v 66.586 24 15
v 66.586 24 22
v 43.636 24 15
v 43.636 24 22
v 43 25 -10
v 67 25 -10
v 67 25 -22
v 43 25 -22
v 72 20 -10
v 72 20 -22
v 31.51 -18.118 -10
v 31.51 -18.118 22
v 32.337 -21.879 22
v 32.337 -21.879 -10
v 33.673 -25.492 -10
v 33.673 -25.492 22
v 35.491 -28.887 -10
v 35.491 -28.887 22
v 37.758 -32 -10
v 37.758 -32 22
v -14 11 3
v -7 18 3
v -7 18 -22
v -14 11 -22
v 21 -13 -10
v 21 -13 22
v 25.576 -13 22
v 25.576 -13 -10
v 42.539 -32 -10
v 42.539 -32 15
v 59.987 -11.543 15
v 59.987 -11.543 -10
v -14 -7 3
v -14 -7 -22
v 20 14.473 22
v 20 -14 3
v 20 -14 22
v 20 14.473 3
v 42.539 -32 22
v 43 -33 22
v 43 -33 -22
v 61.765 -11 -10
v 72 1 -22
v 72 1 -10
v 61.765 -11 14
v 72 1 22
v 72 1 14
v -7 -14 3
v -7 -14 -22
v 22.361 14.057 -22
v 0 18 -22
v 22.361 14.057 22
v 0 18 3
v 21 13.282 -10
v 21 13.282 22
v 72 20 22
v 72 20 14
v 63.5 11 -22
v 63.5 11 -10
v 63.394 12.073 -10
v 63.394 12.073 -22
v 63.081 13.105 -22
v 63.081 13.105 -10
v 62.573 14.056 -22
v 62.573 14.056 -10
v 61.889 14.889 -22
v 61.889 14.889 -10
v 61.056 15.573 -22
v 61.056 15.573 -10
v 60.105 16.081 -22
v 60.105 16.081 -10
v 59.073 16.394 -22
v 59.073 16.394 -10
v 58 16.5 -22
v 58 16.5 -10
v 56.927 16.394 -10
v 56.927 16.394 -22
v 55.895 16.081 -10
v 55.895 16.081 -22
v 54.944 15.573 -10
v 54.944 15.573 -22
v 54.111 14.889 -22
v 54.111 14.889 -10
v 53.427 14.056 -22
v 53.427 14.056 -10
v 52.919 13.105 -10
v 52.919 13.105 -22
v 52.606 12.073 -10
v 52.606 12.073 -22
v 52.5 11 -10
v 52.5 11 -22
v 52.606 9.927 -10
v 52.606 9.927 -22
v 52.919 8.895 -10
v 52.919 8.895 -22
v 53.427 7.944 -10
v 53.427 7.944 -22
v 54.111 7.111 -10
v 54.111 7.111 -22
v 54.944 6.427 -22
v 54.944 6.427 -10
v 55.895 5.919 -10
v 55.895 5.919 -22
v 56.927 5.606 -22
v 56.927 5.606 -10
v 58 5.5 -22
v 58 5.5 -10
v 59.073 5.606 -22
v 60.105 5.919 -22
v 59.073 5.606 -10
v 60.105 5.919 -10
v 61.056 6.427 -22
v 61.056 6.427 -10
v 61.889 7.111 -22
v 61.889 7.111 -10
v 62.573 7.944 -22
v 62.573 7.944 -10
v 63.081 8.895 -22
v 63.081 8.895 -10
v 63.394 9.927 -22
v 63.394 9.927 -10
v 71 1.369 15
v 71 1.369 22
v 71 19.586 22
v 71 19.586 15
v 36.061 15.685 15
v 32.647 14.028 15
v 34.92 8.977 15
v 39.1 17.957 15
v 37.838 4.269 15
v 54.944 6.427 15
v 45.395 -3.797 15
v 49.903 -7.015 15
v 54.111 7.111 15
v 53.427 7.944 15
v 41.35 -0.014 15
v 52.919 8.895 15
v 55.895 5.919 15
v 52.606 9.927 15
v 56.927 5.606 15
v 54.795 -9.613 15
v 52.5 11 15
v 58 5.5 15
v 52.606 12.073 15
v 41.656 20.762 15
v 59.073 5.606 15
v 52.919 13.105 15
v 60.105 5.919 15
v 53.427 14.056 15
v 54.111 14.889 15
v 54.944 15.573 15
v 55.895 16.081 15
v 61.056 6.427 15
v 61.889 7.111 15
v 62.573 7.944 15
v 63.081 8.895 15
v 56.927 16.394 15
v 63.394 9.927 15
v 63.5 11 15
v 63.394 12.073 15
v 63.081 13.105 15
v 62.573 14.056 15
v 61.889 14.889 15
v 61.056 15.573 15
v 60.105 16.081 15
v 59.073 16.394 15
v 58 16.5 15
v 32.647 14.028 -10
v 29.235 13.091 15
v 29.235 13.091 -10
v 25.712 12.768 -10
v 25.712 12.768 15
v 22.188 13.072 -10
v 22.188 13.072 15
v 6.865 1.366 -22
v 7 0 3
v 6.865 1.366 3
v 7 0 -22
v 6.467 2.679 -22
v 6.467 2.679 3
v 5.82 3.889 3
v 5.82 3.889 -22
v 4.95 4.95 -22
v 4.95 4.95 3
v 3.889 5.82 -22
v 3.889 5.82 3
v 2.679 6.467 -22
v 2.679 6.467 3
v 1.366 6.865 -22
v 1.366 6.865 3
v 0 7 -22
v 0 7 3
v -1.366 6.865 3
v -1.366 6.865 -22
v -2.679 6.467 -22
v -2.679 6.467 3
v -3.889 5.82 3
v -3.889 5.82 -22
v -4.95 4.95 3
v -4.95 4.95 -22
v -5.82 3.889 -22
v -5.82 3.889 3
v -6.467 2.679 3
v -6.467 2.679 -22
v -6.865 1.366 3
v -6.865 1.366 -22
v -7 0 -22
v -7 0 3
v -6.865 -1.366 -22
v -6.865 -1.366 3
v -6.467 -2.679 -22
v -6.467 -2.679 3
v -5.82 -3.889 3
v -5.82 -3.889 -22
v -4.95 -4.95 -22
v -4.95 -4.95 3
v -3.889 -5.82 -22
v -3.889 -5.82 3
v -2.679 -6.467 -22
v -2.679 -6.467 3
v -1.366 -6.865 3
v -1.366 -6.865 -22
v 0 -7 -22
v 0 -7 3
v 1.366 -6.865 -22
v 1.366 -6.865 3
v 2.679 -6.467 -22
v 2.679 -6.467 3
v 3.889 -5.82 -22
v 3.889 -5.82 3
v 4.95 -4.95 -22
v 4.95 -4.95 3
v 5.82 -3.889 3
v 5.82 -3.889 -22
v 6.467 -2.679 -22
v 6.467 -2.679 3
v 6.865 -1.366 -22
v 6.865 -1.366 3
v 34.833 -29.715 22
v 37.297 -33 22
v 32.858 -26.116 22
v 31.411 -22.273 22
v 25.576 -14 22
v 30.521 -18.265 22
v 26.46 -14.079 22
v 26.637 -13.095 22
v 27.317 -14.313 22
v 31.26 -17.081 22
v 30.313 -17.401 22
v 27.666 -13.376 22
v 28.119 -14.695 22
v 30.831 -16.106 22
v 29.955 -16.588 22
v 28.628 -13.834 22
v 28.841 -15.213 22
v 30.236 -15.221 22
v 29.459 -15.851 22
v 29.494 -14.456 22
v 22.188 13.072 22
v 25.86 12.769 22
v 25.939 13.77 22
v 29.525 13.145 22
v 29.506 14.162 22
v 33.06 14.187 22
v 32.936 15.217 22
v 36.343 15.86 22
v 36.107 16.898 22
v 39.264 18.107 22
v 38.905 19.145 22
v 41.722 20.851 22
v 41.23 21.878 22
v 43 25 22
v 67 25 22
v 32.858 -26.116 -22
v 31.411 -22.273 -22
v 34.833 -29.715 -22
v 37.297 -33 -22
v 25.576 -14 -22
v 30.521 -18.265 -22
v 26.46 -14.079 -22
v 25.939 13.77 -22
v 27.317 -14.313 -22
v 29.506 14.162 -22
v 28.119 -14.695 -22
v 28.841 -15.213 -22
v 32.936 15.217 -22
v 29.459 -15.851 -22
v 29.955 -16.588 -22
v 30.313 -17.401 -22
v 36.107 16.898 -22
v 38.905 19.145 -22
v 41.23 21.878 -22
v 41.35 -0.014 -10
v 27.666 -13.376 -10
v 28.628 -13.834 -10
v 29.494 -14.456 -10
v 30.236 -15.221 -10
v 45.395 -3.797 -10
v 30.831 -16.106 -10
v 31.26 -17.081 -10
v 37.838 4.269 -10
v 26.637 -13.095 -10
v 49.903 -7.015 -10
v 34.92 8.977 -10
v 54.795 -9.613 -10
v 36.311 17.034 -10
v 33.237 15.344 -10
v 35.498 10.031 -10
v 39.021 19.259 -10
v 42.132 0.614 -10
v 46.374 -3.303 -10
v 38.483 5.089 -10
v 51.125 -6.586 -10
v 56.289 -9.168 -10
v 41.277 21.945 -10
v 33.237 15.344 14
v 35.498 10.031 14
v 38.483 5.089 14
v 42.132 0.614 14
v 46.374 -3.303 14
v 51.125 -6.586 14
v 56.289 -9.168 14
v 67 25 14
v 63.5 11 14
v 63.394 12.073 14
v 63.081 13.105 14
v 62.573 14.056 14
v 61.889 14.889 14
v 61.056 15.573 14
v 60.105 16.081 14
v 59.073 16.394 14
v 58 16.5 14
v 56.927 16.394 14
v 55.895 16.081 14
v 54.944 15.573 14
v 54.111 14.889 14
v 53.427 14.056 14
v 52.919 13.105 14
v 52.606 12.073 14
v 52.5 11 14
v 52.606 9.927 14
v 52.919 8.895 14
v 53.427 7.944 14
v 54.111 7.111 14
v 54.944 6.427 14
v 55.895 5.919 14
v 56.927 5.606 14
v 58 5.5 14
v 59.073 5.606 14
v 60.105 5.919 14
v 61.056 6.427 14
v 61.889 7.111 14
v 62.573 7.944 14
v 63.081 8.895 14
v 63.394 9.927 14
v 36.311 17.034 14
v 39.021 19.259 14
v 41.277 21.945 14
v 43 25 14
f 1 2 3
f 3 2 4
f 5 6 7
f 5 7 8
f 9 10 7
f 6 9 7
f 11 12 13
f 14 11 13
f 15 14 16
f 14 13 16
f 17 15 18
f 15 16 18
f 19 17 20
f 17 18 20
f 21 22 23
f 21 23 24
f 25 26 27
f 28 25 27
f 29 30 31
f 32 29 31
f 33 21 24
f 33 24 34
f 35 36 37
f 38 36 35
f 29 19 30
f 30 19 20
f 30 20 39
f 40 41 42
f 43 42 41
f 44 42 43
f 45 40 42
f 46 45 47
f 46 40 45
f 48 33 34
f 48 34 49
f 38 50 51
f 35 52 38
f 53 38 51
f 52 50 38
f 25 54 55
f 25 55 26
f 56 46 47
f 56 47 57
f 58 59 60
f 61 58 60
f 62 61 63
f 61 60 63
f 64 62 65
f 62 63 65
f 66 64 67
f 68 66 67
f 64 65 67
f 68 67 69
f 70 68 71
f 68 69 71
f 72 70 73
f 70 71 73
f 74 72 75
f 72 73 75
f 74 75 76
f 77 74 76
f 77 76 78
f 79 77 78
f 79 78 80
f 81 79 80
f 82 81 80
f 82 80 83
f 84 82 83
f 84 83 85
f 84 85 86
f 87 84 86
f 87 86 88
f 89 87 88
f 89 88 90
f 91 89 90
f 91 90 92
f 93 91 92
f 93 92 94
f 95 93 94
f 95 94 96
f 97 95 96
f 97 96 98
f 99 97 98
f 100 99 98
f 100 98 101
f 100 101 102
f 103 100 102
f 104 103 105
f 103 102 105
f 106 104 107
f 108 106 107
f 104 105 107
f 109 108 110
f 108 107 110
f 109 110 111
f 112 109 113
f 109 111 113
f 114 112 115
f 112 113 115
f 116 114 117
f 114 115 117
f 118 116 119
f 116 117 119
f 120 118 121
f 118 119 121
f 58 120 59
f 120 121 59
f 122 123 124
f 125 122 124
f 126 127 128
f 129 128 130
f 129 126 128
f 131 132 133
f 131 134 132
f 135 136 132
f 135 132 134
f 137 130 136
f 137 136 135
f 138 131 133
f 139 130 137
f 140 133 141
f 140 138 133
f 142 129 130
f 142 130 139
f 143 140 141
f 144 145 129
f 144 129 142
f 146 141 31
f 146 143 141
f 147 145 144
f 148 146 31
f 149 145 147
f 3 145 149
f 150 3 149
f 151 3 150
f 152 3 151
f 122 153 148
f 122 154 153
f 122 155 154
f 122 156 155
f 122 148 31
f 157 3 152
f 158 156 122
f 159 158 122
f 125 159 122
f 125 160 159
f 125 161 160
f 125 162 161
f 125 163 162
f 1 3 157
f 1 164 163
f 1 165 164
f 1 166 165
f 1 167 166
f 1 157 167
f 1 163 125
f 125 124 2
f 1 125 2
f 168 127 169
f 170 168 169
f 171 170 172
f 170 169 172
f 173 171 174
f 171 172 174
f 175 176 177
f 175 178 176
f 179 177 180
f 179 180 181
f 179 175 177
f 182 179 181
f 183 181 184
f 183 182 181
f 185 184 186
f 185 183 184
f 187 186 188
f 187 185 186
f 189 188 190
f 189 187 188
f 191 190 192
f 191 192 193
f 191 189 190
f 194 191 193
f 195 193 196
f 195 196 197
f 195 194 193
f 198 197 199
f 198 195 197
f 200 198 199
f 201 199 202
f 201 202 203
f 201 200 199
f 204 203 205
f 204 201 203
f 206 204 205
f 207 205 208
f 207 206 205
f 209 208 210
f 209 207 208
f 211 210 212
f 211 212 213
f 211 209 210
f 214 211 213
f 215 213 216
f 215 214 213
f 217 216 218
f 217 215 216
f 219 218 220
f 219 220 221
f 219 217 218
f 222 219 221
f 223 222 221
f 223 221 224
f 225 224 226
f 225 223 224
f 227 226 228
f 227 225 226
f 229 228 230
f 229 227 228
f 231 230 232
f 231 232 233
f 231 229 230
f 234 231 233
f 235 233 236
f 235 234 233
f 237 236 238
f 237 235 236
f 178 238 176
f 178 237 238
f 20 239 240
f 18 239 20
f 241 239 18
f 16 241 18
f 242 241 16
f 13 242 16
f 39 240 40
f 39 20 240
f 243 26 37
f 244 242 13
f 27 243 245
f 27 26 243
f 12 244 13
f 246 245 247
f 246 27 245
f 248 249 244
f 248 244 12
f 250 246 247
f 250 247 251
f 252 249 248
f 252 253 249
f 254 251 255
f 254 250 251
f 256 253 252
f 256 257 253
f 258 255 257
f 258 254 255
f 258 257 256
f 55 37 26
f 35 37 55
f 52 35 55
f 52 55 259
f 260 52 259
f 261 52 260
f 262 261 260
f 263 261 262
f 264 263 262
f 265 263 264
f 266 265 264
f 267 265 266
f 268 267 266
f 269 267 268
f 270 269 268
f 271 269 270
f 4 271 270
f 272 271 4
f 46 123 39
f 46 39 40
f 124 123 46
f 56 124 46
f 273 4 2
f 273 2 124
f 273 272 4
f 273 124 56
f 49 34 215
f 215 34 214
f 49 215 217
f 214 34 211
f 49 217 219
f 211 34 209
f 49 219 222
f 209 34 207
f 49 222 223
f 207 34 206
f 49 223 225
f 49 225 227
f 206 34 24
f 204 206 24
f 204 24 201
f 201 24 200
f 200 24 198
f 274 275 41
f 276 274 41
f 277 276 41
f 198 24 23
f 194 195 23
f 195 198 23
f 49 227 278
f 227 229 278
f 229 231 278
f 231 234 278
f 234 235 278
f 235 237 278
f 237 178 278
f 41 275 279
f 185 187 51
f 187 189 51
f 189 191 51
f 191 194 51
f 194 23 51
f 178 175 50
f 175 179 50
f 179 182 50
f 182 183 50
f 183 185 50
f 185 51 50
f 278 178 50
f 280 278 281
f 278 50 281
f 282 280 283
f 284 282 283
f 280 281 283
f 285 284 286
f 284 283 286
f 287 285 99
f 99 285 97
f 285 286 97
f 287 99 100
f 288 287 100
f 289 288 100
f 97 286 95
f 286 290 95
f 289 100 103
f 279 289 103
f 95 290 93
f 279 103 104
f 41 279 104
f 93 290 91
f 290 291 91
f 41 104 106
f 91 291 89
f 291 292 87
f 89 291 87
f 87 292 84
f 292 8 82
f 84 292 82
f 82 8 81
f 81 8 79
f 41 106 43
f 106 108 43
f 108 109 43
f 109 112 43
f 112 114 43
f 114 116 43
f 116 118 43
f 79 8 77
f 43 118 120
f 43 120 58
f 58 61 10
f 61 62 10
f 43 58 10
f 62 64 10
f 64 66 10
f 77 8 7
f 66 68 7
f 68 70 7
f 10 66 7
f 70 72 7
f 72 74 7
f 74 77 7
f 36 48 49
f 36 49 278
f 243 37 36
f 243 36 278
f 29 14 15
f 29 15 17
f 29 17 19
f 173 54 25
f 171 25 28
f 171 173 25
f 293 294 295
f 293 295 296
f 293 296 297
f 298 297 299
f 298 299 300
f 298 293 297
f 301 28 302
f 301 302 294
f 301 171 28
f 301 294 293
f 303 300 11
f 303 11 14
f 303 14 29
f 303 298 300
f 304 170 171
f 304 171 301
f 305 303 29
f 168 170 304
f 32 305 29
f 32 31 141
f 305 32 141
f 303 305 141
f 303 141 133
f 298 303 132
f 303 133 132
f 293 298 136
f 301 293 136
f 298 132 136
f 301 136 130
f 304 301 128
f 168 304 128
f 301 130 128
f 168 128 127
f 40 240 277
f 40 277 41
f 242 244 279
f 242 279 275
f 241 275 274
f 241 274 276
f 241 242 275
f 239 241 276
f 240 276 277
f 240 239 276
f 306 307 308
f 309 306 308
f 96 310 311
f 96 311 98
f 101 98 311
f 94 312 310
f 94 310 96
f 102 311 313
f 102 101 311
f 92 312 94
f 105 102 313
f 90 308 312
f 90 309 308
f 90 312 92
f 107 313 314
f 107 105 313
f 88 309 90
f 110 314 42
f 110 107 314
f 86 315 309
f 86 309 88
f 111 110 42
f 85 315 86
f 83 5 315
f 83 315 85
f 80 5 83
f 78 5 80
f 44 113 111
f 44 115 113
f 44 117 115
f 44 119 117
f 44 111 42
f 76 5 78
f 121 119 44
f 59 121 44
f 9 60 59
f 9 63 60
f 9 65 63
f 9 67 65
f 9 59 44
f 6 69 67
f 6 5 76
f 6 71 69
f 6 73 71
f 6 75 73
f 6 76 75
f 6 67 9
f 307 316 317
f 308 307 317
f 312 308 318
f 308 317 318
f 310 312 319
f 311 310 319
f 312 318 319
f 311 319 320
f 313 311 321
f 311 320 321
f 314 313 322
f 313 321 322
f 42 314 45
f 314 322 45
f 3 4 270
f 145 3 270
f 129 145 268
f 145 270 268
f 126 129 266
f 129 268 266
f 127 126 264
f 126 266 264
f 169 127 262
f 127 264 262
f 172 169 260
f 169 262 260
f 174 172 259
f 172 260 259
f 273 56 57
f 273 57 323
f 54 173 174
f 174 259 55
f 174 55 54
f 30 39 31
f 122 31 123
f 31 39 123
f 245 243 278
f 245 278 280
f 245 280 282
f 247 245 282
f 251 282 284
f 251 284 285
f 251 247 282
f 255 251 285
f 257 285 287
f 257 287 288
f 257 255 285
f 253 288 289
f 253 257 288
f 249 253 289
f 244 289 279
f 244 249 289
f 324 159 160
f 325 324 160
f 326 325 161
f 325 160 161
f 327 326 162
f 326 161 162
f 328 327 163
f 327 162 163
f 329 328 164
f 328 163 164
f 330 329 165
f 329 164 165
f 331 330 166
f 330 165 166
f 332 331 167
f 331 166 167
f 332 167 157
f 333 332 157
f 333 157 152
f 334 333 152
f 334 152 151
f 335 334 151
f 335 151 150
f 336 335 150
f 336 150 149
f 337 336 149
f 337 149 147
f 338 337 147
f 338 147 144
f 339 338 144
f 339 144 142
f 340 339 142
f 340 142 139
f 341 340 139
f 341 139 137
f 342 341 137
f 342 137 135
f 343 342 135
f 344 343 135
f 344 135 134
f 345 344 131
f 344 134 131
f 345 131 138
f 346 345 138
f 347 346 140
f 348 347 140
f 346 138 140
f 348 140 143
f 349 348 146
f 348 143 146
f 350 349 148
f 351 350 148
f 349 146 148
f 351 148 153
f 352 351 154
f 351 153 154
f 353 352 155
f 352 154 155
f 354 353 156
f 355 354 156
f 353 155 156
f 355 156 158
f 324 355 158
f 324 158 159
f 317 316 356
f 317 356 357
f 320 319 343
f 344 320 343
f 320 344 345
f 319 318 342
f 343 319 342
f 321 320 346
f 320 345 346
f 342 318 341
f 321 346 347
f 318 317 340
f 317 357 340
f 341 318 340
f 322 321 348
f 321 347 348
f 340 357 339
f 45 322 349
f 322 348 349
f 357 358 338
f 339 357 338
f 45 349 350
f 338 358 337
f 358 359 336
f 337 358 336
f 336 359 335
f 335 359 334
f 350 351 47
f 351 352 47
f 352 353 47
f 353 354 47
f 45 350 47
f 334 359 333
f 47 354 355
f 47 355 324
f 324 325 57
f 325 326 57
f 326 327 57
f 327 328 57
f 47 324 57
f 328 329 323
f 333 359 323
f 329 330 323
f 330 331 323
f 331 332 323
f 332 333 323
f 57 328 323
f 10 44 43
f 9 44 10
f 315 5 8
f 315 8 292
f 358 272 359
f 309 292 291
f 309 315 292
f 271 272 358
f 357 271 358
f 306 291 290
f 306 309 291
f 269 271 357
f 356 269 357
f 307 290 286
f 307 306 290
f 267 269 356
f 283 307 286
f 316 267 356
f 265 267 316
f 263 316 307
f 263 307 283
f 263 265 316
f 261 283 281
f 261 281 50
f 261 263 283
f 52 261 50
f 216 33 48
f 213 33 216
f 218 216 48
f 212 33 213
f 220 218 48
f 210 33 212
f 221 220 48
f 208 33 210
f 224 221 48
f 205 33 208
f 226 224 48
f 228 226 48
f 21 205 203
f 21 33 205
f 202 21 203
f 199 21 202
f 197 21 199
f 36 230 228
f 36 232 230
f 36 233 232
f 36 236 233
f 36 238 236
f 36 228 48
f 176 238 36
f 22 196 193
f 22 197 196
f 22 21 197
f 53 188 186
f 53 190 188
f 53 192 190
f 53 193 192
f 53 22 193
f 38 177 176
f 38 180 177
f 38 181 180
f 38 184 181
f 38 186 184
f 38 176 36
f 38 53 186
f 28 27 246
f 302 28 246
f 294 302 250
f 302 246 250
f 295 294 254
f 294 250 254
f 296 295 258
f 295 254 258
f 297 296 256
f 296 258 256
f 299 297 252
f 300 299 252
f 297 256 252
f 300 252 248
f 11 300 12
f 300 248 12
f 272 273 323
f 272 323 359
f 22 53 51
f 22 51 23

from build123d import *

# Parameters (mm, degrees)
SKETCH1_R           = 7
BOSS_EXTRUDE1_DEPTH = 22
CUT_EXTRUDE1_START  = 14
CUT_EXTRUDE1_DEPTH  = 24
CUT_EXTRUDE2_START  = -19
SKETCH5_R           = 7
CUT_EXTRUDE2_DEPTH  = 19
SKETCH6_R           = 5.5
CUT_EXTRUDE3_DEPTH  = 91.60353194
CUT_EXTRUDE4_DEPTH  = 7
CUT_EXTRUDE5_DEPTH  = 25


with BuildPart() as part:
    # Sketch1 → Boss-Extrude1 (new, symmetric)
    with BuildSketch(Plane.XY):
        with BuildLine():
            Line((-14, 11), (-14, -7))
            Line((-14, -7), (-7, -14))
            Line((-7, -14), (25.575538911, -14))
            ThreePointArc((25.575538911, -14), (28.840774692, -15.213413768), (30.521177653, -18.264705882))
            ThreePointArc((30.521177653, -18.264705882), (32.858007856, -26.115672061), (37.296980053, -33))
            Line((37.296980053, -33), (43, -33))
            Line((43, -33), (72, 1))
            Line((72, 1), (72, 20))
            Line((72, 20), (67, 25))
            Line((67, 25), (43, 25))
            ThreePointArc((43, 25), (34.561098706, 15.982044142), (22.361380836, 14.057085233))
            Line((22.361380836, 14.057085233), (0, 18))
            Line((0, 18), (-7, 18))
            Line((-7, 18), (-14, 11))
        make_face()
        Circle(SKETCH1_R, mode=Mode.SUBTRACT)
    extrude(amount=BOSS_EXTRUDE1_DEPTH, both=True)

    # Sketch3 → Cut-Extrude1 (cut)
    with BuildSketch(Plane.XY.offset(CUT_EXTRUDE1_START)):
        with BuildLine():
            Line((72, 1), (72, 20))
            Line((72, 20), (67, 25))
            Line((67, 25), (43, 25))
            ThreePointArc((43, 25), (39.021244343, 19.259333621), (33.236936549, 15.344294617))
            ThreePointArc((33.236936549, 15.344294617), (44.184262982, -1.419294771), (61.764705882, -11))
            Line((61.764705882, -11), (72, 1))
        make_face()
    extrude(amount=-CUT_EXTRUDE1_DEPTH, mode=Mode.SUBTRACT)

    # Sketch5 → Cut-Extrude2 (cut)
    with BuildSketch(Plane.XY.offset(22).offset(CUT_EXTRUDE2_START)):
        Polygon((20, -14), (20, 14.473460386), (0, 18), (-7, 18), (-14, 11), (-14, -7), (-7, -14), align=None)
        Circle(SKETCH5_R, mode=Mode.SUBTRACT)
    extrude(amount=CUT_EXTRUDE2_DEPTH, mode=Mode.SUBTRACT)

    # Sketch6 → Cut-Extrude3 (cut, through all)
    with BuildSketch(Plane.XY.offset(22)):
        with Locations((58, 11)):
            Circle(SKETCH6_R)
    extrude(amount=-CUT_EXTRUDE3_DEPTH, mode=Mode.SUBTRACT)

    # Sketch7 → Cut-Extrude4 (cut)
    with BuildSketch(Plane.XY.offset(22)):
        with BuildLine():
            Line((22.187732658, 13.07227748), (21, 13.281706793))
            Line((21, 13.281706793), (21, -13))
            Line((21, -13), (25.575538911, -13))
            ThreePointArc((25.575538911, -13), (29.493821849, -14.456096521), (31.510305401, -18.117647059))
            ThreePointArc((31.510305401, -18.117647059), (33.672704892, -25.491599052), (37.758271763, -32))
            Line((37.758271763, -32), (42.538593943, -32))
            Line((42.538593943, -32), (71, 1.368545033))
            Line((71, 1.368545033), (71, 19.585786438))
            Line((71, 19.585786438), (66.585786438, 24))
            Line((66.585786438, 24), (43.636084685, 24))
            ThreePointArc((43.636084685, 24), (34.740005768, 14.948047079), (22.187732658, 13.07227748))
        make_face()
    extrude(amount=-CUT_EXTRUDE4_DEPTH, mode=Mode.SUBTRACT)

    # Sketch8 → Cut-Extrude5 (cut)
    with BuildSketch(Plane.XY.offset(15)):
        with BuildLine():
            Line((42.538593943, -32), (59.986847747, -11.543426575))
            ThreePointArc((59.986847747, -11.543426575), (43.310181683, -1.972127362), (32.646682943, 14.028208705))
            ThreePointArc((32.646682943, 14.028208705), (27.481076416, 12.851449437), (22.187732658, 13.07227748))
            Line((22.187732658, 13.07227748), (21, 13.281706793))
            Line((21, 13.281706793), (21, -13))
            Line((21, -13), (25.575538911, -13))
            ThreePointArc((25.575538911, -13), (29.493821849, -14.456096521), (31.510305401, -18.117647059))
            ThreePointArc((31.510305401, -18.117647059), (33.672704892, -25.491599052), (37.758271763, -32))
            Line((37.758271763, -32), (42.538593943, -32))
        make_face()
    extrude(amount=-CUT_EXTRUDE5_DEPTH, mode=Mode.SUBTRACT)


solid = part.part
